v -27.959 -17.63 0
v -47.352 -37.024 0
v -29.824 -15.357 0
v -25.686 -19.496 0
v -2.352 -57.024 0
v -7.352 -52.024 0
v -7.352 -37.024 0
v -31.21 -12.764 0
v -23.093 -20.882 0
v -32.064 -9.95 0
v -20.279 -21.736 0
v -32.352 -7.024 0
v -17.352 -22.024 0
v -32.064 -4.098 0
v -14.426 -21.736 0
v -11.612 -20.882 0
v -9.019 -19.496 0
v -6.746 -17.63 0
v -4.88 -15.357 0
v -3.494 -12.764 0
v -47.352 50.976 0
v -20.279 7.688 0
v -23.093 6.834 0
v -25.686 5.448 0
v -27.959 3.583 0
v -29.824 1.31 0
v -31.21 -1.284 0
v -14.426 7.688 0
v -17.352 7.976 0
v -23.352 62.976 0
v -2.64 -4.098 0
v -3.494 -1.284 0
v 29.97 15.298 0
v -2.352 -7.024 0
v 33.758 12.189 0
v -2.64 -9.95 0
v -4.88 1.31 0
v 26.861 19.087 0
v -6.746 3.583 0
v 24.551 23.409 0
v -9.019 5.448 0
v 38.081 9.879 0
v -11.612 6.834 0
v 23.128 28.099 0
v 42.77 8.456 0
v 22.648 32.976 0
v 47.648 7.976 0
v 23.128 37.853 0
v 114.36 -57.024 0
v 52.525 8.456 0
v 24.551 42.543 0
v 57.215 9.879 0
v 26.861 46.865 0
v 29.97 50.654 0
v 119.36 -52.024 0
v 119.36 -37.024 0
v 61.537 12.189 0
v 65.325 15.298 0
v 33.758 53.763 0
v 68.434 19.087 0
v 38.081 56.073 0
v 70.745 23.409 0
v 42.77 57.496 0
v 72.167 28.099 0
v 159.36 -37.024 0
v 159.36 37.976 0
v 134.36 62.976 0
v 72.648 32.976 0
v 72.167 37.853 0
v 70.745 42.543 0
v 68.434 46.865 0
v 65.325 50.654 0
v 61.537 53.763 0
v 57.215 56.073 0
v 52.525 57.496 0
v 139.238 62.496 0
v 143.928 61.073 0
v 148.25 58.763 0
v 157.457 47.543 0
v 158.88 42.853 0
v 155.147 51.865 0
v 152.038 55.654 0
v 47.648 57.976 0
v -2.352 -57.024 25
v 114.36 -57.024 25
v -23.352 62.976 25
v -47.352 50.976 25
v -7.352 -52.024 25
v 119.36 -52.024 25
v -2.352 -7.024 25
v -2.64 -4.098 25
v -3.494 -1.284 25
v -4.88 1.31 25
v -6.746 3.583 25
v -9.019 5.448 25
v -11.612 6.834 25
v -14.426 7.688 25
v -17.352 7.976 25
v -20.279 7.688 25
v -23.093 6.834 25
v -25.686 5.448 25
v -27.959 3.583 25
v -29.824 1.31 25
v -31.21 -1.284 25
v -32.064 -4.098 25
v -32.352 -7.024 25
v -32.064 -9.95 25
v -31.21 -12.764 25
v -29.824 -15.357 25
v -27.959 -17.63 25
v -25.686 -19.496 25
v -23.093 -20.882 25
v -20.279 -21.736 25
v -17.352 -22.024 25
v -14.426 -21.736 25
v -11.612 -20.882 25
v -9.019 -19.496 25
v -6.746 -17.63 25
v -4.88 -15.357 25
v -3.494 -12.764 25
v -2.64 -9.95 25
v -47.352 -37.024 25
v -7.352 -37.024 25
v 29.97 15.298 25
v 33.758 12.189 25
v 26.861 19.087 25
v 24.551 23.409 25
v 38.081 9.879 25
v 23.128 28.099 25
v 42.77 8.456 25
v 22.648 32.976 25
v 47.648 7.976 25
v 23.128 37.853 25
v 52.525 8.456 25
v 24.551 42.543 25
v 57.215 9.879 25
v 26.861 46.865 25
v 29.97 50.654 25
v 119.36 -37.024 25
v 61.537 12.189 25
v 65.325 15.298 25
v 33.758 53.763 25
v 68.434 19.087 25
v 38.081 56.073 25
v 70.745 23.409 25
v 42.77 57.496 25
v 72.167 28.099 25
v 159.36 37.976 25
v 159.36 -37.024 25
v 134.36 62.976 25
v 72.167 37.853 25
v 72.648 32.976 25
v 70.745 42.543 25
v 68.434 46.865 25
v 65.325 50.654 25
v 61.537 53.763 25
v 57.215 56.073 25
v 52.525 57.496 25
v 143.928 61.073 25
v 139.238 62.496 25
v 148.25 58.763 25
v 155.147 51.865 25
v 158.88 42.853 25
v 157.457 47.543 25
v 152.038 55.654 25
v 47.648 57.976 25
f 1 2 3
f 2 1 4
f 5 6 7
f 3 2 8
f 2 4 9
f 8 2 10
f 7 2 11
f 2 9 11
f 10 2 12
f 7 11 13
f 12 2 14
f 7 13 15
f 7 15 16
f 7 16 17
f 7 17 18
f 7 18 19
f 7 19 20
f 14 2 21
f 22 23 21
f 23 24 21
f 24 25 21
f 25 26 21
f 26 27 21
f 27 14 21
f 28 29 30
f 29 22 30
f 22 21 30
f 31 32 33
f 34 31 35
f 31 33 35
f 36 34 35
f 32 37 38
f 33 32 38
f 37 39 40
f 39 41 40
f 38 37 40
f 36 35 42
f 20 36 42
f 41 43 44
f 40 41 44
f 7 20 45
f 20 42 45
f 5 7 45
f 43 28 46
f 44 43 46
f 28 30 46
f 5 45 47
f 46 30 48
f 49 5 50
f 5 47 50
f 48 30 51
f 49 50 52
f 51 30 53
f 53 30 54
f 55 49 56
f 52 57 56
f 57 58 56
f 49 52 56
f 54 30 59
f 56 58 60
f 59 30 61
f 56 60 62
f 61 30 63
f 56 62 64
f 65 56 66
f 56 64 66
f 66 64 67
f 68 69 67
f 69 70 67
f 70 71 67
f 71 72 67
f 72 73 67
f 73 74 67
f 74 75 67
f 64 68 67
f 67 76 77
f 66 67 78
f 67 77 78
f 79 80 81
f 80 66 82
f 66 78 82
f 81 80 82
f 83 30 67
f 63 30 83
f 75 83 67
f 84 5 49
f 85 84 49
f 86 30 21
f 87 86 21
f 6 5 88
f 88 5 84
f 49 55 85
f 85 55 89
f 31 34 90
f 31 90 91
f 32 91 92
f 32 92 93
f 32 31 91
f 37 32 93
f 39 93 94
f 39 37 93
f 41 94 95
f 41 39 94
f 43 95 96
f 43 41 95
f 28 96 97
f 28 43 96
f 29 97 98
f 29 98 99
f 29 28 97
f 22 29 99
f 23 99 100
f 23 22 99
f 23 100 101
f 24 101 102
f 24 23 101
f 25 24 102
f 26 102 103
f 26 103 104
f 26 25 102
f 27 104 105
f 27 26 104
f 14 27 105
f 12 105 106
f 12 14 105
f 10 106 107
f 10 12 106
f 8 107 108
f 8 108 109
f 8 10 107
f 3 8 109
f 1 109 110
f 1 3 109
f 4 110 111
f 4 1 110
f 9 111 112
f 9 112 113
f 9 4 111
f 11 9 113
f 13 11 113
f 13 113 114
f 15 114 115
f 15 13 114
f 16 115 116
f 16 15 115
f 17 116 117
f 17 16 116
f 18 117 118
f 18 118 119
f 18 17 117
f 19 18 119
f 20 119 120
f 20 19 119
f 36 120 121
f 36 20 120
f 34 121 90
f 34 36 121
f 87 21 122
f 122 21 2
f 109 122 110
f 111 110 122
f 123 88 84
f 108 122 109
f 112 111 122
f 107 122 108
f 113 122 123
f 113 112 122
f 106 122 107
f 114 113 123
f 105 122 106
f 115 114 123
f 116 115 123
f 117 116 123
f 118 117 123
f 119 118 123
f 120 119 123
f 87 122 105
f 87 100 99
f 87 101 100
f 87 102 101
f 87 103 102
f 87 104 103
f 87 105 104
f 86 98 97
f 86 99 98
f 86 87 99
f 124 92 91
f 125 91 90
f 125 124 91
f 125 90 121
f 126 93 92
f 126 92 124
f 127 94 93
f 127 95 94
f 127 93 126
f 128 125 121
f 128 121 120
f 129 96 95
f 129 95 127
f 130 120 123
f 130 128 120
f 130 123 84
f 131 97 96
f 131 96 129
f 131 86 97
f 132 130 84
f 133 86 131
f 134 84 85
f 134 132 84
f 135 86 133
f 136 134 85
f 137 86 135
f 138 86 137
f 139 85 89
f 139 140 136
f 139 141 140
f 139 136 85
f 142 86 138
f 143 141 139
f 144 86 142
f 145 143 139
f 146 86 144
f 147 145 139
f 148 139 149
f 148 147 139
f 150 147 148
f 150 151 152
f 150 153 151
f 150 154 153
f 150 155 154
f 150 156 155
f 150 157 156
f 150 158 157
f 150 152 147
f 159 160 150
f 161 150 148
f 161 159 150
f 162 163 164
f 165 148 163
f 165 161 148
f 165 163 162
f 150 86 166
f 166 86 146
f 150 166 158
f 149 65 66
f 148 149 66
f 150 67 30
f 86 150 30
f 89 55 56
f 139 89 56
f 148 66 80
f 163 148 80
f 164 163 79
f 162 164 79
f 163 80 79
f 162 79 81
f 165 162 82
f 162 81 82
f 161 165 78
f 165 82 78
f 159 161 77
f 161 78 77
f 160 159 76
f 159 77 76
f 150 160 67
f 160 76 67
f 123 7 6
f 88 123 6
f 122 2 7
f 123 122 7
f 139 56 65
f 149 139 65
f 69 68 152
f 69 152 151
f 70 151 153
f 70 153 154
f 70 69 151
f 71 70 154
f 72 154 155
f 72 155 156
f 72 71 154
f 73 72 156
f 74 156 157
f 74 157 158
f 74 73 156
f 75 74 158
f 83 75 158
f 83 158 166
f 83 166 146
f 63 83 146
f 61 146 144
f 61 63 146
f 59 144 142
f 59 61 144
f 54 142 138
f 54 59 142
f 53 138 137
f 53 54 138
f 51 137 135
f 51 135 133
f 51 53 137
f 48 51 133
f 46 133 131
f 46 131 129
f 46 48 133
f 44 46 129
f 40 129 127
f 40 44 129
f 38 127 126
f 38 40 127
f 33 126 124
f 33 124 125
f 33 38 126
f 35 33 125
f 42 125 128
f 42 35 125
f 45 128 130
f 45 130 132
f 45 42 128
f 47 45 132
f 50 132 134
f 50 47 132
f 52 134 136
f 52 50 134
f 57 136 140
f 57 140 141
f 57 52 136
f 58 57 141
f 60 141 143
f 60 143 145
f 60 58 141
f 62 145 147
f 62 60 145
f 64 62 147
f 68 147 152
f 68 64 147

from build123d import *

# Parameters (mm, degrees)
F0_R     = 15
F0_R_2   = 25
F1_DEPTH = 25
F2_SIZE  = 5


with BuildPart() as f1:
    # F0 (on Top) → F1 (new body)
    with BuildSketch(Plane.XY):
        with BuildLine():
            Line((-23.352277, 62.976109), (-47.352277, 50.976109))
            Line((-47.352277, 50.976109), (-47.352277, -7.023891))
            Line((-47.352277, -7.023891), (-47.352277, -37.023891))
            Line((-47.352277, -37.023891), (-17.352277, -37.023891))
            Line((-17.352277, -37.023891), (-7.352277, -37.023891))
            Line((-7.352277, -37.023891), (-7.352277, -57.023891))
            Line((-7.352277, -57.023891), (119.360484, -57.023891))
            Line((119.360484, -57.023891), (119.360484, -37.023891))
            Line((119.360484, -37.023891), (159.360484, -37.023891))
            Line((159.360484, -37.023891), (159.360484, 37.976109))
            ThreePointArc((159.360484, 37.976109), (152.038154, 55.653779), (134.360484, 62.976109))
            Line((134.360484, 62.976109), (-23.352277, 62.976109))
        make_face()
        with Locations((-17.352277, -7.023891)):
            Circle(F0_R, mode=Mode.SUBTRACT)
        with Locations((47.647723, 32.976109)):
            Circle(F0_R_2, mode=Mode.SUBTRACT)
    extrude(amount=F1_DEPTH)

    # F2
    f2_edges = [f1.edges().sort_by_distance(p)[0] for p in [
        (-7.352277, -57.023891, 12.5),
        (119.360484, -57.023891, 12.5),
    ]]
    chamfer(f2_edges, length=F2_SIZE)


solid = f1.part
